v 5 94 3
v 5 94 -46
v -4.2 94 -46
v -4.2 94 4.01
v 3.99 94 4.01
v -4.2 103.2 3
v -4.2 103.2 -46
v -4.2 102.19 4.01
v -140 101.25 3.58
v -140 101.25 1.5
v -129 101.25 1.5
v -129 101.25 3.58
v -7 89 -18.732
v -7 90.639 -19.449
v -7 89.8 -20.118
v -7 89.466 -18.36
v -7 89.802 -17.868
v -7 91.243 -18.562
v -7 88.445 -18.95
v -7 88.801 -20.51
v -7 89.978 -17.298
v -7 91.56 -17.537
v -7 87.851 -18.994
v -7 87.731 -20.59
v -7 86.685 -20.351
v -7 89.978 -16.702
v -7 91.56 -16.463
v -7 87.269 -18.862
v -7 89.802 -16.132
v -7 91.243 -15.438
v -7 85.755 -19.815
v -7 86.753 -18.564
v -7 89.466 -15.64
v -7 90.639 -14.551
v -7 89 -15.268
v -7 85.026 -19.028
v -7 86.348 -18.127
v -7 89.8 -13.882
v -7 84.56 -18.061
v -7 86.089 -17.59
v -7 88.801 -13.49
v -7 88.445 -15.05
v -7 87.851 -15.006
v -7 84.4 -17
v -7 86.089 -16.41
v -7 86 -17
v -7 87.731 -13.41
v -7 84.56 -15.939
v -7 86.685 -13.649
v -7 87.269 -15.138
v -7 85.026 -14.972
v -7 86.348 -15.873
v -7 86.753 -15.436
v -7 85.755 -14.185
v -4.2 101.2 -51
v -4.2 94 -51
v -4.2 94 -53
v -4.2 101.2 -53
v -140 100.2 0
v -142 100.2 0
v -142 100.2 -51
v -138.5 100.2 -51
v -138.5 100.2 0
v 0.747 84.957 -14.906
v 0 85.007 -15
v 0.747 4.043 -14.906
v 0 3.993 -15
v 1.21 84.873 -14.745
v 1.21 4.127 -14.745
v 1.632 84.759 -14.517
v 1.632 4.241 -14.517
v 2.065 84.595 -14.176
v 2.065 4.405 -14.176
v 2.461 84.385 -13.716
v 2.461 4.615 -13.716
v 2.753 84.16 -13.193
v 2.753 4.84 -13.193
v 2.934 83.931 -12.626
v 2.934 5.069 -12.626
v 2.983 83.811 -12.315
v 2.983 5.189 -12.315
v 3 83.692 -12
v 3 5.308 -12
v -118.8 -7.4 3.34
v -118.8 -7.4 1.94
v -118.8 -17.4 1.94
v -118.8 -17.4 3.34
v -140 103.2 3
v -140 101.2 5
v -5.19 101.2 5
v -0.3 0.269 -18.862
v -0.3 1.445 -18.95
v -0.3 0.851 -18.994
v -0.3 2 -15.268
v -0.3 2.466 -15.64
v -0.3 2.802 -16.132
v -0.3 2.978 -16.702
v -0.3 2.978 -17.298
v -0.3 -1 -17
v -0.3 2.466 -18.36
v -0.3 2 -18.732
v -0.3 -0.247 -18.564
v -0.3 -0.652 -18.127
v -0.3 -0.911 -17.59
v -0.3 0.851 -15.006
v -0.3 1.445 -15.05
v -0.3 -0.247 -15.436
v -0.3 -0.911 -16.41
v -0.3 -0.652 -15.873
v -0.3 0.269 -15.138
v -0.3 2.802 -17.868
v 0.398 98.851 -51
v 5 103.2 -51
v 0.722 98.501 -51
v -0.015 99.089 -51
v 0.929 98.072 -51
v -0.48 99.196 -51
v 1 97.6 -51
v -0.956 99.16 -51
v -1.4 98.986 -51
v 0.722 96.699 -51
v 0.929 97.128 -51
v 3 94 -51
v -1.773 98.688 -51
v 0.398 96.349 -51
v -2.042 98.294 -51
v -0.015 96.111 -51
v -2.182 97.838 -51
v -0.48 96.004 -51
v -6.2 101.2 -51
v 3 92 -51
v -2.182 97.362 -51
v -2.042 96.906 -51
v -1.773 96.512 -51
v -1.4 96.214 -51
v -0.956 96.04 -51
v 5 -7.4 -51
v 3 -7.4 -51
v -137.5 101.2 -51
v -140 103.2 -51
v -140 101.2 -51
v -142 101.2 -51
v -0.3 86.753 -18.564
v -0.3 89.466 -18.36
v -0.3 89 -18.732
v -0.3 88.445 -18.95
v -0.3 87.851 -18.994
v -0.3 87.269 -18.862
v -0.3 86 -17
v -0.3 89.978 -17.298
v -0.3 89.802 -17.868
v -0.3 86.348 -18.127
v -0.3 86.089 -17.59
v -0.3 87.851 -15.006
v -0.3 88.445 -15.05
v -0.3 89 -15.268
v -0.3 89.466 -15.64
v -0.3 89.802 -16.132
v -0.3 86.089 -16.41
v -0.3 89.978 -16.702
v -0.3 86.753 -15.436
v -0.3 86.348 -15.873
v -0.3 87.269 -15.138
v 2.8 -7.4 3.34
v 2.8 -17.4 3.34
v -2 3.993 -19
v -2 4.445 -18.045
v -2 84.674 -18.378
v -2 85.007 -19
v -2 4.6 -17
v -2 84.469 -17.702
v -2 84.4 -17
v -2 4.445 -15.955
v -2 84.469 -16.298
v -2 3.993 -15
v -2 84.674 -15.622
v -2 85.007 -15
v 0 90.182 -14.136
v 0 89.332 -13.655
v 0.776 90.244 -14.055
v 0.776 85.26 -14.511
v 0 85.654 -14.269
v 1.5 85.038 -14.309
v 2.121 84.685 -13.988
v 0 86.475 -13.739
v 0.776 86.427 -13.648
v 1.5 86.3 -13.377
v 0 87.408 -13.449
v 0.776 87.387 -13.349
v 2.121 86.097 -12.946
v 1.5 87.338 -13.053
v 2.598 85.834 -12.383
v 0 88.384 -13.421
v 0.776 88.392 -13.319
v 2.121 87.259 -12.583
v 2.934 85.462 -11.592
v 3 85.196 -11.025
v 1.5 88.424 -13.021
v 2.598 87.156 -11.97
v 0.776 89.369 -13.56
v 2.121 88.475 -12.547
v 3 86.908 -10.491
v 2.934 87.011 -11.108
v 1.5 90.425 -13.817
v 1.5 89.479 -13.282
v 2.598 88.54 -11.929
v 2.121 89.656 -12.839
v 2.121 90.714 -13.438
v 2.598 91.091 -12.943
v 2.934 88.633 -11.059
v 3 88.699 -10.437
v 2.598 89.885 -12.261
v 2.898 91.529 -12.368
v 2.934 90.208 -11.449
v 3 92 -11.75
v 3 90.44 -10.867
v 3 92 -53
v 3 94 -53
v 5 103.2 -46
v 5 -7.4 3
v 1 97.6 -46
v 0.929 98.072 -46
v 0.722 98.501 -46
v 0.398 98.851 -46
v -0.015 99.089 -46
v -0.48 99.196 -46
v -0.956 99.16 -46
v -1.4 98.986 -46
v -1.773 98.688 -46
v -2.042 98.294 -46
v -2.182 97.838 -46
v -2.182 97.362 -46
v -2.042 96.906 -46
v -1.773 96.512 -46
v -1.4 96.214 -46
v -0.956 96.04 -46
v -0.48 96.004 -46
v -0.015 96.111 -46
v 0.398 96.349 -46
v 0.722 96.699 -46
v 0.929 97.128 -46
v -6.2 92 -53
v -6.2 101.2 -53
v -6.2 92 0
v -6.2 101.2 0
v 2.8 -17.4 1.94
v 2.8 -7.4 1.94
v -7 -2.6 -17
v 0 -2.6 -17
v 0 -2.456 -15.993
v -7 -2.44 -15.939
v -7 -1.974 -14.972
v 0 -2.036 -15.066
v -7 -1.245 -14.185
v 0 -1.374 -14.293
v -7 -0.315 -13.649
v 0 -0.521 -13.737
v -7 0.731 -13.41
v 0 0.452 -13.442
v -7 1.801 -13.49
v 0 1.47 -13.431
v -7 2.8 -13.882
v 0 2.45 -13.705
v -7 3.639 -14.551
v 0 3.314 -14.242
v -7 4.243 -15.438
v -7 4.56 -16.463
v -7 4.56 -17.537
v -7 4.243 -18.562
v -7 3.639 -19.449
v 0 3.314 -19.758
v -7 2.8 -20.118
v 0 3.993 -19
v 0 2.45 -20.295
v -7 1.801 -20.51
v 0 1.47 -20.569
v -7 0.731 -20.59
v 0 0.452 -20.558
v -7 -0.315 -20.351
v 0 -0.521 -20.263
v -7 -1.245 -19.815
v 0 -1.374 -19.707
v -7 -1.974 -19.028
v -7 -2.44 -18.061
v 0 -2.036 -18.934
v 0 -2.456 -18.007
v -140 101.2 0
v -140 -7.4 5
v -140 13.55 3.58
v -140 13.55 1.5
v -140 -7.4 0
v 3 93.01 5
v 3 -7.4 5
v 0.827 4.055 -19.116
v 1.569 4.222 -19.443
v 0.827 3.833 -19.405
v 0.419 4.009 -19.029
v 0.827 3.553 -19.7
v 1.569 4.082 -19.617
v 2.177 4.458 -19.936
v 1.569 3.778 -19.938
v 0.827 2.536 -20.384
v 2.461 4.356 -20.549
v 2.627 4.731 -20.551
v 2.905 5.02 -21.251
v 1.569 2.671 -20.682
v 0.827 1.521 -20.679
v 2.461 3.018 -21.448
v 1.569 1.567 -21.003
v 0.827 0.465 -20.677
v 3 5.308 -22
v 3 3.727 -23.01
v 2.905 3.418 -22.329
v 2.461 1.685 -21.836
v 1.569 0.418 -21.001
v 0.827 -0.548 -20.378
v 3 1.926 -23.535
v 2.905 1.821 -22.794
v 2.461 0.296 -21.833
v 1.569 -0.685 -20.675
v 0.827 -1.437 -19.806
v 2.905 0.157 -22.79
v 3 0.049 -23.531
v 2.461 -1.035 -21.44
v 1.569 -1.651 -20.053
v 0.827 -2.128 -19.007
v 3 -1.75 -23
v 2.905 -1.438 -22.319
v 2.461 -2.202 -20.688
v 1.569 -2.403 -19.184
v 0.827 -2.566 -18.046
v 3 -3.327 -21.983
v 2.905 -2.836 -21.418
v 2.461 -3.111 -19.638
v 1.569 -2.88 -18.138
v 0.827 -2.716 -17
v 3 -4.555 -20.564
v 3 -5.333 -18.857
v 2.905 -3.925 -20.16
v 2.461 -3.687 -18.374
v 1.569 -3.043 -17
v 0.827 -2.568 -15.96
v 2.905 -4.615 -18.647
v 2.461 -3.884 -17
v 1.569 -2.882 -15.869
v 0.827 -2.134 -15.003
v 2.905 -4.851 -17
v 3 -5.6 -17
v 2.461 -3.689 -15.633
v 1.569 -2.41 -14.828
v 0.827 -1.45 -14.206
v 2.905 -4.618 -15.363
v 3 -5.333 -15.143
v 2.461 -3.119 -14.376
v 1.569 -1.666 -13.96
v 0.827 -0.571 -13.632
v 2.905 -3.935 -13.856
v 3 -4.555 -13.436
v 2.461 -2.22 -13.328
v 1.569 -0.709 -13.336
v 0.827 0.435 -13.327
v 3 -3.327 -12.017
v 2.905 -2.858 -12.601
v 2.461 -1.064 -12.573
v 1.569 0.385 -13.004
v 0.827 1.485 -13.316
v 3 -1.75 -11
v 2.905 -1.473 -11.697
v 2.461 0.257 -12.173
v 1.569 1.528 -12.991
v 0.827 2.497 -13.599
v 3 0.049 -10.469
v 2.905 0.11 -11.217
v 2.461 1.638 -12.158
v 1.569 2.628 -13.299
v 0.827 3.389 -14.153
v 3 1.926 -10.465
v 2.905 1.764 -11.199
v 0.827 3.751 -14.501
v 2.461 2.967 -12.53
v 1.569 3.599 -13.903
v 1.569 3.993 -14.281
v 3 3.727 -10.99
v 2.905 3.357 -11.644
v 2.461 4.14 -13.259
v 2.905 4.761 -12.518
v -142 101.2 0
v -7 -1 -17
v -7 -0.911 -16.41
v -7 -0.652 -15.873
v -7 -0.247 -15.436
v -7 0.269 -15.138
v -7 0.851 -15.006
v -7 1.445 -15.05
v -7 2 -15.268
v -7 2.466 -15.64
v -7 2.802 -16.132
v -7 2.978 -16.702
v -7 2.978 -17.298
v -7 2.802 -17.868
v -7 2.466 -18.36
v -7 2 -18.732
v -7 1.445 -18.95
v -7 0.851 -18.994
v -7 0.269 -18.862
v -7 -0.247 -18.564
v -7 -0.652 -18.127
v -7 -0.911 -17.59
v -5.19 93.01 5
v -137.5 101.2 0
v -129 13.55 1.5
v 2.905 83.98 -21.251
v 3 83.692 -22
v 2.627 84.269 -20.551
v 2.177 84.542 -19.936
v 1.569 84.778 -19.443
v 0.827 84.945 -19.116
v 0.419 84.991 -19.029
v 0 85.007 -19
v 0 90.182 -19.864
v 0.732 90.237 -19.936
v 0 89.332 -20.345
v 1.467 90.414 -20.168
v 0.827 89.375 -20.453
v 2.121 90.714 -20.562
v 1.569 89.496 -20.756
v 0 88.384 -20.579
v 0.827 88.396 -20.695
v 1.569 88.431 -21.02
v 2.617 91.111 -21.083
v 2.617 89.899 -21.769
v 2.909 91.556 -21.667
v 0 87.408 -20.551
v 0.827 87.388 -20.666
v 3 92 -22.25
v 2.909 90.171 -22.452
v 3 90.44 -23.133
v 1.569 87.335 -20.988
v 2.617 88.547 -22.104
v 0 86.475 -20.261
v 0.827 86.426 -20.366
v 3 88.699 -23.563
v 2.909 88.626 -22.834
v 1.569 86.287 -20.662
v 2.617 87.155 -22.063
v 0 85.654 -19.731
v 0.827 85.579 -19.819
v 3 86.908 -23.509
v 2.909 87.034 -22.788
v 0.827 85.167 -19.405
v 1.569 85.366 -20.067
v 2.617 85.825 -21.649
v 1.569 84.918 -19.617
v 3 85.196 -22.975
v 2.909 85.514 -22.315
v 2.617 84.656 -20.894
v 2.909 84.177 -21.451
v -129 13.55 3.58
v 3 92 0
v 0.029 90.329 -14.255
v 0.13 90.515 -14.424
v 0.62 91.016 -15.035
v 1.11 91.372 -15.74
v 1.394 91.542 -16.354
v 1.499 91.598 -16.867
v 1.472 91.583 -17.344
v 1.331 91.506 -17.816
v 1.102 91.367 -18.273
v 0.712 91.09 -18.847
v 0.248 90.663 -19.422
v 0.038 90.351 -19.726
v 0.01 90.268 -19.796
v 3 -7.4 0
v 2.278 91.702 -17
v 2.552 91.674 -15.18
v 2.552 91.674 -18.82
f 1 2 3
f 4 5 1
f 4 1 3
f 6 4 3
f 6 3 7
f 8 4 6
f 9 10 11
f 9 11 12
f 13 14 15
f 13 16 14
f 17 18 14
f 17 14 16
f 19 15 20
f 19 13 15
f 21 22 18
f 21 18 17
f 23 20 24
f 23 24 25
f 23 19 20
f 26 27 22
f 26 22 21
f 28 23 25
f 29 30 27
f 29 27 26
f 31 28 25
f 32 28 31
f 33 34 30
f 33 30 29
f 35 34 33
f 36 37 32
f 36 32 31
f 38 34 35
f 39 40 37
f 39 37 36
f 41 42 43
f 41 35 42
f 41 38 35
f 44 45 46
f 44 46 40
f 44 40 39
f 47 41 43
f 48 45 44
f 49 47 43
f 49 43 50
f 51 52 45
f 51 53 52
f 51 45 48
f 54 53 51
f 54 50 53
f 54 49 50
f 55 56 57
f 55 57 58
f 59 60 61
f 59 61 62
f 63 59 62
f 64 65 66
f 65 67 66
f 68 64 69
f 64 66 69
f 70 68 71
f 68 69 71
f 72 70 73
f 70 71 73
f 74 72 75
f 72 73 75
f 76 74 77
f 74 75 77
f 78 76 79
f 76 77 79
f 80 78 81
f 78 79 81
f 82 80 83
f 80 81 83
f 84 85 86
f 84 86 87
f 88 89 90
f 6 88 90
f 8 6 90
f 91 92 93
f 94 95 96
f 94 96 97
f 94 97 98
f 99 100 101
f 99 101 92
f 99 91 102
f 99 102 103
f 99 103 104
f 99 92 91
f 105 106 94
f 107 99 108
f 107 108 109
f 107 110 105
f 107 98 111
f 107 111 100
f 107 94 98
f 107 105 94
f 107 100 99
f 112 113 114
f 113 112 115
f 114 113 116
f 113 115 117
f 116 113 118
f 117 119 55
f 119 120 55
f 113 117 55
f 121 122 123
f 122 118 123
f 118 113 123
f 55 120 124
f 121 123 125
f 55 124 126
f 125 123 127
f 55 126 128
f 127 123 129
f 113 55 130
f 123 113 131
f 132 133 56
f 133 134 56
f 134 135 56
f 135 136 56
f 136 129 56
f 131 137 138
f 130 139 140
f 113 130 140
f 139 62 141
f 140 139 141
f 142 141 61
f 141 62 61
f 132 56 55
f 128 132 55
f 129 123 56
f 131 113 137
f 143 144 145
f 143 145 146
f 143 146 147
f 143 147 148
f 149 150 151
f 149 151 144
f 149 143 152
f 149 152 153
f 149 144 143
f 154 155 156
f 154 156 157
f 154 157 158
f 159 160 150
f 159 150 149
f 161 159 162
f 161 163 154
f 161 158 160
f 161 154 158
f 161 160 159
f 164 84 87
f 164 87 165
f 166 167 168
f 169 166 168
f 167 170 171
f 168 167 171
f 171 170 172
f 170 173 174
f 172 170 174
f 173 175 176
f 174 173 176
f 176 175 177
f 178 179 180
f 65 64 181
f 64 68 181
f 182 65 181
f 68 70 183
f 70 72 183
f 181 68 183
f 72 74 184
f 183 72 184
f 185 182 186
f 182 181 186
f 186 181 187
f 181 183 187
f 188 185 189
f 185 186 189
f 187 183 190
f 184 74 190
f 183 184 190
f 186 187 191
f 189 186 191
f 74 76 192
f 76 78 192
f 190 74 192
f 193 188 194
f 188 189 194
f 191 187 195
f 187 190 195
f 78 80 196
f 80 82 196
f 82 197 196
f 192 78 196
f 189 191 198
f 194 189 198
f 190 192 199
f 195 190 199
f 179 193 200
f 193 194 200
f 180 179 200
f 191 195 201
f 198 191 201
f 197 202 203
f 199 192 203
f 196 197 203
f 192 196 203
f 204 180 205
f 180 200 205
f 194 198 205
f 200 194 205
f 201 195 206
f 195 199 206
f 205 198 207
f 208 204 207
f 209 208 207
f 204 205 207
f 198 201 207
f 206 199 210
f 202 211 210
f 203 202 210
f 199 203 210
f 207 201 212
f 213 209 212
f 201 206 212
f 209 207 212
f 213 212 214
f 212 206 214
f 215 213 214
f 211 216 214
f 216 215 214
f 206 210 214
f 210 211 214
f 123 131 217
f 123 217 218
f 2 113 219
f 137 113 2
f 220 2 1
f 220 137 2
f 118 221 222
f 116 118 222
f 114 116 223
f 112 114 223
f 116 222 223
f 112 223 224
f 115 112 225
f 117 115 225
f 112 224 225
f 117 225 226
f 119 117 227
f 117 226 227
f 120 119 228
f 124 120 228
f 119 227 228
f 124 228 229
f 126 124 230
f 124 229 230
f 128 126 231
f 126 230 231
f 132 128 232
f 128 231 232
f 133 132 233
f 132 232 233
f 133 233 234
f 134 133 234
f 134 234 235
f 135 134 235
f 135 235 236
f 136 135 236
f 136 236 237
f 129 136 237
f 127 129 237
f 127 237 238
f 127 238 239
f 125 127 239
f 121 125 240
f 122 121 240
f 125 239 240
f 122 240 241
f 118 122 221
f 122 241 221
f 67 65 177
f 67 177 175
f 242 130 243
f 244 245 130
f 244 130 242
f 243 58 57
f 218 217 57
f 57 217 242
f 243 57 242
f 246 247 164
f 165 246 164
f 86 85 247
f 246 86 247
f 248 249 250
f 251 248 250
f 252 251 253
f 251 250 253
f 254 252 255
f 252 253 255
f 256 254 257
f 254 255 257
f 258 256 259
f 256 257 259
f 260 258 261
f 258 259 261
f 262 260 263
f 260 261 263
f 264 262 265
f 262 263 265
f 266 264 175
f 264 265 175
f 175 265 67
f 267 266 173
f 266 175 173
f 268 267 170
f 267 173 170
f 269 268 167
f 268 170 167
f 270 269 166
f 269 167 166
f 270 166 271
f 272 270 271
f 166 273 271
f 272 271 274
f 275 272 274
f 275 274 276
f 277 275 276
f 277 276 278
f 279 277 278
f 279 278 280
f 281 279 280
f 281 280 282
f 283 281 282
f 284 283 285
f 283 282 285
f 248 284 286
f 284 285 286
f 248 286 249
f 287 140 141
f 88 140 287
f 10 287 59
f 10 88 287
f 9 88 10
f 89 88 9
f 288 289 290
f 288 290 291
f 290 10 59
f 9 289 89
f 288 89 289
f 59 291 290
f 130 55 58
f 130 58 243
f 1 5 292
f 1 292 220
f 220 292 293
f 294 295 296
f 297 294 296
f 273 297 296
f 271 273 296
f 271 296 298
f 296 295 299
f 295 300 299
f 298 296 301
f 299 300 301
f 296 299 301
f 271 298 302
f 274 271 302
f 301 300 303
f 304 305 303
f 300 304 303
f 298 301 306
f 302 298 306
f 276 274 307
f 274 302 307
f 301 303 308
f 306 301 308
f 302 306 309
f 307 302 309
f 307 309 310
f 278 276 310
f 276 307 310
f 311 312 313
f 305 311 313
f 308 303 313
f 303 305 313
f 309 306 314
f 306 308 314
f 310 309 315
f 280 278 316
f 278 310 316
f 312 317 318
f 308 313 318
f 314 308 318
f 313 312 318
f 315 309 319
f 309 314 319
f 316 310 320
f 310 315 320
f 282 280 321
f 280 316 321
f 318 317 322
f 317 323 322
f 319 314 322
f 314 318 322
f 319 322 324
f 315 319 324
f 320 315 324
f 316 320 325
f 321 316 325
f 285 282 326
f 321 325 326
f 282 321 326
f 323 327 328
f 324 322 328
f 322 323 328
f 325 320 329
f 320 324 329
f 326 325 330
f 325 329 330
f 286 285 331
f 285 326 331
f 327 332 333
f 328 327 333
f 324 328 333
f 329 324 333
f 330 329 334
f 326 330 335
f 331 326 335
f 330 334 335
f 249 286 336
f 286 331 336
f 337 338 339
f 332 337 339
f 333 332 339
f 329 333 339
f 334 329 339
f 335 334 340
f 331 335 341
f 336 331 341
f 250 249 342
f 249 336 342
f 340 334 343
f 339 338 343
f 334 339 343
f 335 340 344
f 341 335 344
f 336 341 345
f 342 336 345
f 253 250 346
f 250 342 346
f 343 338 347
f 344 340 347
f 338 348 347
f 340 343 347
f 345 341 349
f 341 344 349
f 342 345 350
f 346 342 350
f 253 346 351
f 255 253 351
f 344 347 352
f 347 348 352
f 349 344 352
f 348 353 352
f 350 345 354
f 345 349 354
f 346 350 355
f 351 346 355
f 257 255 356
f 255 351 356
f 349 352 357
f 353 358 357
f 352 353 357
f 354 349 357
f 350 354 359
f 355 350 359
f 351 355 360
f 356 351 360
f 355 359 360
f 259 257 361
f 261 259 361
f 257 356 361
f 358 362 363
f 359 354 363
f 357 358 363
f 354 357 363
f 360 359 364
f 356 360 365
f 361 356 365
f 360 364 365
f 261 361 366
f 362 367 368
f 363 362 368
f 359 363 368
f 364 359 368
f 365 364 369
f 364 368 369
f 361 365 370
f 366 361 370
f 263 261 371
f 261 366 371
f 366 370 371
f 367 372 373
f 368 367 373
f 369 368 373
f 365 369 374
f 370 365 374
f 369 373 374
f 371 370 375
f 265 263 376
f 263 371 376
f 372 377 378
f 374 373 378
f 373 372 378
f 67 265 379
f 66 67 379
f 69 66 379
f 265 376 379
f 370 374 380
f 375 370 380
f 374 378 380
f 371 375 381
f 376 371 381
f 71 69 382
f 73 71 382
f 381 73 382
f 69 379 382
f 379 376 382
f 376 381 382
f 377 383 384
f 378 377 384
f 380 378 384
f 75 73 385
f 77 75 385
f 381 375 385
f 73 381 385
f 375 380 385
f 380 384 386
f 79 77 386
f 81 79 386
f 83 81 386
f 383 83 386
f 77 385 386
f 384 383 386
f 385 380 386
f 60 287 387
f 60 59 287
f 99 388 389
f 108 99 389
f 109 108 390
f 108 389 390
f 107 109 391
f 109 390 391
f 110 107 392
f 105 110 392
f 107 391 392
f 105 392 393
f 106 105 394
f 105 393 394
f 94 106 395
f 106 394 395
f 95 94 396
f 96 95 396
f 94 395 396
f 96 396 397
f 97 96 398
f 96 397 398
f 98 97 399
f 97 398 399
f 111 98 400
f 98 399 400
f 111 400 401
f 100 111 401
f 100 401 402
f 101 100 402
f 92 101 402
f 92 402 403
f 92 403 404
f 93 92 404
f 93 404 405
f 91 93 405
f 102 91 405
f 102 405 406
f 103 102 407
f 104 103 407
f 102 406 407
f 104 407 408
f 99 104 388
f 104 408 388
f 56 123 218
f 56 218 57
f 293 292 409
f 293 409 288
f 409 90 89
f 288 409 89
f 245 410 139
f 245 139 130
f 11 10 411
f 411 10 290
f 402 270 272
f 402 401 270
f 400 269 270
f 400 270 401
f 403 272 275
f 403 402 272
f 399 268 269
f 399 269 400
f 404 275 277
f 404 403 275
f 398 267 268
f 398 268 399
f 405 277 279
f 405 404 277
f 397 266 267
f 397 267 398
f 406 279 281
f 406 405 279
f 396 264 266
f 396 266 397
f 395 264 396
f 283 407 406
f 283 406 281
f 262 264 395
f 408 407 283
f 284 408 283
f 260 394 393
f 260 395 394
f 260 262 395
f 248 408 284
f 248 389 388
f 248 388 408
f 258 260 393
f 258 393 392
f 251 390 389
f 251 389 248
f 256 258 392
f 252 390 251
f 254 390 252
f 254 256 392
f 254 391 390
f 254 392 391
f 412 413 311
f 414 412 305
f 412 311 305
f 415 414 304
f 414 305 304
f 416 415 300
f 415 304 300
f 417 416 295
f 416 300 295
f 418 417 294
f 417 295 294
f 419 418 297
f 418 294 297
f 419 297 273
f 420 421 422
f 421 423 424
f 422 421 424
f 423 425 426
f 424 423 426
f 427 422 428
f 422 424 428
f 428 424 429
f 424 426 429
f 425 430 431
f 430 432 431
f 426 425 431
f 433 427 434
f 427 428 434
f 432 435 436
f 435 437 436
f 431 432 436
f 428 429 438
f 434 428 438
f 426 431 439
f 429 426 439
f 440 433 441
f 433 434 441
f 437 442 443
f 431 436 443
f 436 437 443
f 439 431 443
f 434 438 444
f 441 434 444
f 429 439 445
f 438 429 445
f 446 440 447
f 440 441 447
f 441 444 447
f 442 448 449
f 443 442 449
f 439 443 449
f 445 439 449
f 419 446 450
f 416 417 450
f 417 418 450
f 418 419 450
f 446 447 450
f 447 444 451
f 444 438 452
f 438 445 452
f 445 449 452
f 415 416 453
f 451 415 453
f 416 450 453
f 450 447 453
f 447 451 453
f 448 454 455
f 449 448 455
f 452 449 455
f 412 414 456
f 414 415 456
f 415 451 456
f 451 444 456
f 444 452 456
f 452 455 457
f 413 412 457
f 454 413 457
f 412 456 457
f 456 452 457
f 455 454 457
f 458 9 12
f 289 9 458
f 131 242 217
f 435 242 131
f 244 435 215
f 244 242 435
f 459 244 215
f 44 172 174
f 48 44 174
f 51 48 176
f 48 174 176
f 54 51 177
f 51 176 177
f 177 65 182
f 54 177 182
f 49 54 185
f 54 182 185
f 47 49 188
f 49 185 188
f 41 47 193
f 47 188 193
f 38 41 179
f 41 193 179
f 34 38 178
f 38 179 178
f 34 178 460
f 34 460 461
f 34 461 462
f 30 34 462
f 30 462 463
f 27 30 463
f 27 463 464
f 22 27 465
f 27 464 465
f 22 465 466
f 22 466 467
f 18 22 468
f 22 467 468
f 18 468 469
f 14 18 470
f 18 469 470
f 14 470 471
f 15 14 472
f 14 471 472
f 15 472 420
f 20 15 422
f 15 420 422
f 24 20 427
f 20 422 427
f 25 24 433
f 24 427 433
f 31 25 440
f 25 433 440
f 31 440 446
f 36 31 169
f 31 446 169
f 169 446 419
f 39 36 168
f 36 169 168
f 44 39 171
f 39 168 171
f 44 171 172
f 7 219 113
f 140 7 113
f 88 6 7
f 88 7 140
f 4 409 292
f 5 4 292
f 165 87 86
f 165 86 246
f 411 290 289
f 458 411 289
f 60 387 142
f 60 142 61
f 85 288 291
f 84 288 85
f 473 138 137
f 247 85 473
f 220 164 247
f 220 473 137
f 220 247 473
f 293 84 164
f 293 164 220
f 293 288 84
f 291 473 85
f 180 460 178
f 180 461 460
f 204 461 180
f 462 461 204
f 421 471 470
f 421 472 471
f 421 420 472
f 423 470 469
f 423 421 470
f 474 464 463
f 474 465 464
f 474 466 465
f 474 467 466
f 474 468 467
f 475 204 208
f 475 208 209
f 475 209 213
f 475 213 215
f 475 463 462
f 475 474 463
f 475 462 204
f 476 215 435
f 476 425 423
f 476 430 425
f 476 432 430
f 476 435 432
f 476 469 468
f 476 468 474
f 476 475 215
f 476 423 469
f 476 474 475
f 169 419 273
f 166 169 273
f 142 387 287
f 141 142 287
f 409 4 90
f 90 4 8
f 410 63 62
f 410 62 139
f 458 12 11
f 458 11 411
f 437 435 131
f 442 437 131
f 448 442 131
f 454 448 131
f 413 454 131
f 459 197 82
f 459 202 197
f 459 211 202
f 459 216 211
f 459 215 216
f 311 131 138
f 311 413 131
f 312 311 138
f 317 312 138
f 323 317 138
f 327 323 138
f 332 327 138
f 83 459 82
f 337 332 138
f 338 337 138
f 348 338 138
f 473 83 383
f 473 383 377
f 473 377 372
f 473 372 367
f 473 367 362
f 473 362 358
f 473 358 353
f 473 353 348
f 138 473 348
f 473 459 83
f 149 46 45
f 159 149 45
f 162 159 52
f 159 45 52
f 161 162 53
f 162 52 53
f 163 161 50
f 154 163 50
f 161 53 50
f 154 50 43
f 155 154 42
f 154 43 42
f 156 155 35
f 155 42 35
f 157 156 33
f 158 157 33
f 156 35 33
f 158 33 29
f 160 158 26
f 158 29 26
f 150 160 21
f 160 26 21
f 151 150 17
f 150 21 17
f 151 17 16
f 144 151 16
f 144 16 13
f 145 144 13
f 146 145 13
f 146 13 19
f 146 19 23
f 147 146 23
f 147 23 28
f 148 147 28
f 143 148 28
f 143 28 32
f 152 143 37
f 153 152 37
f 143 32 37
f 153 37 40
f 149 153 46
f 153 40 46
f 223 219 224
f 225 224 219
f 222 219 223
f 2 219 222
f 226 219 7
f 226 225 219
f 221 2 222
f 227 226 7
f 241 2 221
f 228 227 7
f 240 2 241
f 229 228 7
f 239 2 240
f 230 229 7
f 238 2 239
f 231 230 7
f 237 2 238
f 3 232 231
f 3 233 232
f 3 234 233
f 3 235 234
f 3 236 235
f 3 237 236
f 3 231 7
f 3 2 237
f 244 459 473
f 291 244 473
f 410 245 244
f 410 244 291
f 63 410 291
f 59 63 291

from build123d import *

# Parameters (mm, degrees)
SKETCH_1_W      = 140
SKETCH_1_H      = 93
PAD_DEPTH       = 5
SKETCH_W        = 140
SKETCH_H        = 7.4
PAD001_DEPTH    = 5
PAD005_DEPTH    = 5
SKETCH002_W     = 9.2
SKETCH002_H     = 9.2
POCKET_DEPTH    = 5
SKETCH004_W     = 2
SKETCH004_H     = 101.4
PAD004_DEPTH    = 51
SKETCH010_W     = 87.7
SKETCH010_H     = 2.08
POCKET003_DEPTH = 11
SKETCH012_W     = 135.8
SKETCH012_H     = 2
PAD006_DEPTH    = 51
PAD007_DEPTH    = 53
SKETCH014_W     = 9.2
SKETCH014_H     = 5
PAD008_DEPTH    = 9.2
SKETCH015_R     = 1.6
POCKET004_DEPTH = 5
SKETCH016_W     = 121.6
SKETCH016_H     = 1.4
PAD009_DEPTH    = 10
CHAMFER_SIZE    = 2
CHAMFER001_SIZE = 0.99
SKETCH017_R     = 3.6
PAD010_DEPTH    = 10
PAD011_DEPTH    = 5
FILLET_R        = 3
SKETCH019_R     = 2
POCKET005_DEPTH = 6.7
PAD012_DEPTH    = 51


with BuildPart() as part:
    # Sketch_1 → Pad (new body)
    with BuildSketch(Plane.XY):
        with Locations((-70, 46.5)):
            Rectangle(SKETCH_1_W, SKETCH_1_H)
    extrude(amount=PAD_DEPTH)

    # Sketch → Pad001 (join)
    with BuildSketch(Plane.XY):
        with Locations((-70, -3.7)):
            Rectangle(SKETCH_W, SKETCH_H)
    extrude(amount=PAD001_DEPTH)

    # Sketch011 (on Face5 of Pad001) → Pad005 (join)
    with BuildSketch(Plane.XY.offset(5)):
        Polygon((-140, 93), (-140, 103.2), (5, 103.2), (5, -7.4), (0, -7.4), (0, 93), align=None)
    extrude(amount=-PAD005_DEPTH)

    # Sketch002 → Pocket (cut)
    with BuildSketch(Plane.XY.offset(5)):
        with Locations((0.4, 98.6)):
            Rectangle(SKETCH002_W, SKETCH002_H)
    extrude(amount=-POCKET_DEPTH, mode=Mode.SUBTRACT)

    # Sketch004 → Pad004 (join)
    with BuildSketch(Plane(origin=(0, 0, 0), x_dir=(1, 0, 0), z_dir=(0, 0, -1))):
        with Locations((4, -43.3)):
            Rectangle(SKETCH004_W, SKETCH004_H)
    extrude(amount=PAD004_DEPTH)

    # Sketch010 → Pocket003 (cut)
    with BuildSketch(Plane(origin=(-140, 0, 0), x_dir=(0, -1, 0), z_dir=(-1, 0, 0))):
        with Locations((-57.4, 2.54)):
            Rectangle(SKETCH010_W, SKETCH010_H)
    extrude(amount=-POCKET003_DEPTH, mode=Mode.SUBTRACT)

    # Sketch012 (on Face10 of Pocket003) → Pad006 (join)
    with BuildSketch(Plane(origin=(0, 0, 0), x_dir=(1, 0, 0), z_dir=(0, 0, -1))):
        with Locations((-72.1, -102.2)):
            Rectangle(SKETCH012_W, SKETCH012_H)
    extrude(amount=PAD006_DEPTH)

    # Sketch013 (on Face10 of Pad006) → Pad007 (join)
    with BuildSketch(Plane(origin=(0, 0, 0), x_dir=(1, 0, 0), z_dir=(0, 0, -1))):
        Polygon((-4.2, -101.2), (-6.2, -101.2), (-6.2, -92), (3, -92), (3, -94), (-4.2, -94), align=None)
    extrude(amount=PAD007_DEPTH)

    # Sketch014 (on Face33 of Pad007) → Pad008 (join)
    with BuildSketch(Plane(origin=(0, 94, 0), x_dir=(-1, 0, 0), z_dir=(0, 1, 0))):
        with Locations((-0.4, -48.5)):
            Rectangle(SKETCH014_W, SKETCH014_H)
    extrude(amount=PAD008_DEPTH)

    # Sketch015 (on Face43 of Pad008) → Pocket004 (cut)
    with BuildSketch(Plane.XY.offset(-46)):
        with Locations((-0.6, 97.6)):
            Circle(SKETCH015_R)
    extrude(amount=-POCKET004_DEPTH, mode=Mode.SUBTRACT)

    # Sketch016 (on Face20 of Pocket004) → Pad009 (join)
    with BuildSketch(Plane.XZ.offset(7.4)):
        with Locations((-58, 2.64)):
            Rectangle(SKETCH016_W, SKETCH016_H)
    extrude(amount=PAD009_DEPTH)

    # Chamfer
    chamfer_edges = [part.edges().sort_by_distance(p)[0] for p in [
        (5, 43.3, 5),
        (-72.1, 103.2, 5),
    ]]
    chamfer(chamfer_edges, length=CHAMFER_SIZE)

    # Chamfer001
    chamfer001_edges = [part.edges().sort_by_distance(p)[0] for p in [
        (-4.2, 97.6, 5),
        (-0.6, 94, 5),
    ]]
    chamfer(chamfer001_edges, length=CHAMFER001_SIZE)

    # Sketch017 (on Face42 of Chamfer001) → Pad010 (join)
    with BuildSketch(Plane(origin=(3, 0, 0), x_dir=(0, -1, 0), z_dir=(-1, 0, 0))):
        with Locations((-88, -17)):
            Circle(SKETCH017_R)
        with Locations((-1, -17)):
            Circle(SKETCH017_R)
    extrude(amount=PAD010_DEPTH)

    # Sketch018 (on Face42 of Pad010) → Pad011 (join)
    with BuildSketch(Plane(origin=(3, 0, 0), x_dir=(0, -1, 0), z_dir=(-1, 0, 0))):
        with BuildLine():
            Line((-85.006674, -15), (-3.993326, -15))
            ThreePointArc((-3.993326, -15), (-4.6, -17), (-3.993326, -19))
            Line((-85.006674, -19), (-3.993326, -19))
            ThreePointArc((-85.006674, -19), (-84.4, -17), (-85.006674, -15))
        make_face()
    extrude(amount=PAD011_DEPTH)

    # Fillet
    fillet_edges = [part.edges().sort_by_distance(p)[0] for p in [
        (3, 44.5, -19),
        (3, 91.6, -17),
        (3, -0.044994, -20.444994),
        (3, 44.5, -15),
        (3, -0.044994, -13.555006),
    ]]
    fillet(fillet_edges, radius=FILLET_R)

    # Sketch019 (on Face32 of Fillet) → Pocket005 (cut)
    with BuildSketch(Plane(origin=(-7, 0, 0), x_dir=(0, -1, 0), z_dir=(-1, 0, 0))):
        with Locations((-88, -17)):
            Circle(SKETCH019_R)
        with Locations((-1, -17)):
            Circle(SKETCH019_R)
    extrude(amount=-POCKET005_DEPTH, mode=Mode.SUBTRACT)

    # Sketch020 (on Face26 of Pocket005) → Pad012 (join)
    with BuildSketch(Plane(origin=(0, 0, 0), x_dir=(1, 0, 0), z_dir=(0, 0, -1))):
        Polygon((-140, -101.2), (-142, -101.2), (-142, -100.2), (-138.5, -100.2), (-137.5, -101.2), (-138.5, -101.2), align=None)
    extrude(amount=PAD012_DEPTH)


solid = part.part
